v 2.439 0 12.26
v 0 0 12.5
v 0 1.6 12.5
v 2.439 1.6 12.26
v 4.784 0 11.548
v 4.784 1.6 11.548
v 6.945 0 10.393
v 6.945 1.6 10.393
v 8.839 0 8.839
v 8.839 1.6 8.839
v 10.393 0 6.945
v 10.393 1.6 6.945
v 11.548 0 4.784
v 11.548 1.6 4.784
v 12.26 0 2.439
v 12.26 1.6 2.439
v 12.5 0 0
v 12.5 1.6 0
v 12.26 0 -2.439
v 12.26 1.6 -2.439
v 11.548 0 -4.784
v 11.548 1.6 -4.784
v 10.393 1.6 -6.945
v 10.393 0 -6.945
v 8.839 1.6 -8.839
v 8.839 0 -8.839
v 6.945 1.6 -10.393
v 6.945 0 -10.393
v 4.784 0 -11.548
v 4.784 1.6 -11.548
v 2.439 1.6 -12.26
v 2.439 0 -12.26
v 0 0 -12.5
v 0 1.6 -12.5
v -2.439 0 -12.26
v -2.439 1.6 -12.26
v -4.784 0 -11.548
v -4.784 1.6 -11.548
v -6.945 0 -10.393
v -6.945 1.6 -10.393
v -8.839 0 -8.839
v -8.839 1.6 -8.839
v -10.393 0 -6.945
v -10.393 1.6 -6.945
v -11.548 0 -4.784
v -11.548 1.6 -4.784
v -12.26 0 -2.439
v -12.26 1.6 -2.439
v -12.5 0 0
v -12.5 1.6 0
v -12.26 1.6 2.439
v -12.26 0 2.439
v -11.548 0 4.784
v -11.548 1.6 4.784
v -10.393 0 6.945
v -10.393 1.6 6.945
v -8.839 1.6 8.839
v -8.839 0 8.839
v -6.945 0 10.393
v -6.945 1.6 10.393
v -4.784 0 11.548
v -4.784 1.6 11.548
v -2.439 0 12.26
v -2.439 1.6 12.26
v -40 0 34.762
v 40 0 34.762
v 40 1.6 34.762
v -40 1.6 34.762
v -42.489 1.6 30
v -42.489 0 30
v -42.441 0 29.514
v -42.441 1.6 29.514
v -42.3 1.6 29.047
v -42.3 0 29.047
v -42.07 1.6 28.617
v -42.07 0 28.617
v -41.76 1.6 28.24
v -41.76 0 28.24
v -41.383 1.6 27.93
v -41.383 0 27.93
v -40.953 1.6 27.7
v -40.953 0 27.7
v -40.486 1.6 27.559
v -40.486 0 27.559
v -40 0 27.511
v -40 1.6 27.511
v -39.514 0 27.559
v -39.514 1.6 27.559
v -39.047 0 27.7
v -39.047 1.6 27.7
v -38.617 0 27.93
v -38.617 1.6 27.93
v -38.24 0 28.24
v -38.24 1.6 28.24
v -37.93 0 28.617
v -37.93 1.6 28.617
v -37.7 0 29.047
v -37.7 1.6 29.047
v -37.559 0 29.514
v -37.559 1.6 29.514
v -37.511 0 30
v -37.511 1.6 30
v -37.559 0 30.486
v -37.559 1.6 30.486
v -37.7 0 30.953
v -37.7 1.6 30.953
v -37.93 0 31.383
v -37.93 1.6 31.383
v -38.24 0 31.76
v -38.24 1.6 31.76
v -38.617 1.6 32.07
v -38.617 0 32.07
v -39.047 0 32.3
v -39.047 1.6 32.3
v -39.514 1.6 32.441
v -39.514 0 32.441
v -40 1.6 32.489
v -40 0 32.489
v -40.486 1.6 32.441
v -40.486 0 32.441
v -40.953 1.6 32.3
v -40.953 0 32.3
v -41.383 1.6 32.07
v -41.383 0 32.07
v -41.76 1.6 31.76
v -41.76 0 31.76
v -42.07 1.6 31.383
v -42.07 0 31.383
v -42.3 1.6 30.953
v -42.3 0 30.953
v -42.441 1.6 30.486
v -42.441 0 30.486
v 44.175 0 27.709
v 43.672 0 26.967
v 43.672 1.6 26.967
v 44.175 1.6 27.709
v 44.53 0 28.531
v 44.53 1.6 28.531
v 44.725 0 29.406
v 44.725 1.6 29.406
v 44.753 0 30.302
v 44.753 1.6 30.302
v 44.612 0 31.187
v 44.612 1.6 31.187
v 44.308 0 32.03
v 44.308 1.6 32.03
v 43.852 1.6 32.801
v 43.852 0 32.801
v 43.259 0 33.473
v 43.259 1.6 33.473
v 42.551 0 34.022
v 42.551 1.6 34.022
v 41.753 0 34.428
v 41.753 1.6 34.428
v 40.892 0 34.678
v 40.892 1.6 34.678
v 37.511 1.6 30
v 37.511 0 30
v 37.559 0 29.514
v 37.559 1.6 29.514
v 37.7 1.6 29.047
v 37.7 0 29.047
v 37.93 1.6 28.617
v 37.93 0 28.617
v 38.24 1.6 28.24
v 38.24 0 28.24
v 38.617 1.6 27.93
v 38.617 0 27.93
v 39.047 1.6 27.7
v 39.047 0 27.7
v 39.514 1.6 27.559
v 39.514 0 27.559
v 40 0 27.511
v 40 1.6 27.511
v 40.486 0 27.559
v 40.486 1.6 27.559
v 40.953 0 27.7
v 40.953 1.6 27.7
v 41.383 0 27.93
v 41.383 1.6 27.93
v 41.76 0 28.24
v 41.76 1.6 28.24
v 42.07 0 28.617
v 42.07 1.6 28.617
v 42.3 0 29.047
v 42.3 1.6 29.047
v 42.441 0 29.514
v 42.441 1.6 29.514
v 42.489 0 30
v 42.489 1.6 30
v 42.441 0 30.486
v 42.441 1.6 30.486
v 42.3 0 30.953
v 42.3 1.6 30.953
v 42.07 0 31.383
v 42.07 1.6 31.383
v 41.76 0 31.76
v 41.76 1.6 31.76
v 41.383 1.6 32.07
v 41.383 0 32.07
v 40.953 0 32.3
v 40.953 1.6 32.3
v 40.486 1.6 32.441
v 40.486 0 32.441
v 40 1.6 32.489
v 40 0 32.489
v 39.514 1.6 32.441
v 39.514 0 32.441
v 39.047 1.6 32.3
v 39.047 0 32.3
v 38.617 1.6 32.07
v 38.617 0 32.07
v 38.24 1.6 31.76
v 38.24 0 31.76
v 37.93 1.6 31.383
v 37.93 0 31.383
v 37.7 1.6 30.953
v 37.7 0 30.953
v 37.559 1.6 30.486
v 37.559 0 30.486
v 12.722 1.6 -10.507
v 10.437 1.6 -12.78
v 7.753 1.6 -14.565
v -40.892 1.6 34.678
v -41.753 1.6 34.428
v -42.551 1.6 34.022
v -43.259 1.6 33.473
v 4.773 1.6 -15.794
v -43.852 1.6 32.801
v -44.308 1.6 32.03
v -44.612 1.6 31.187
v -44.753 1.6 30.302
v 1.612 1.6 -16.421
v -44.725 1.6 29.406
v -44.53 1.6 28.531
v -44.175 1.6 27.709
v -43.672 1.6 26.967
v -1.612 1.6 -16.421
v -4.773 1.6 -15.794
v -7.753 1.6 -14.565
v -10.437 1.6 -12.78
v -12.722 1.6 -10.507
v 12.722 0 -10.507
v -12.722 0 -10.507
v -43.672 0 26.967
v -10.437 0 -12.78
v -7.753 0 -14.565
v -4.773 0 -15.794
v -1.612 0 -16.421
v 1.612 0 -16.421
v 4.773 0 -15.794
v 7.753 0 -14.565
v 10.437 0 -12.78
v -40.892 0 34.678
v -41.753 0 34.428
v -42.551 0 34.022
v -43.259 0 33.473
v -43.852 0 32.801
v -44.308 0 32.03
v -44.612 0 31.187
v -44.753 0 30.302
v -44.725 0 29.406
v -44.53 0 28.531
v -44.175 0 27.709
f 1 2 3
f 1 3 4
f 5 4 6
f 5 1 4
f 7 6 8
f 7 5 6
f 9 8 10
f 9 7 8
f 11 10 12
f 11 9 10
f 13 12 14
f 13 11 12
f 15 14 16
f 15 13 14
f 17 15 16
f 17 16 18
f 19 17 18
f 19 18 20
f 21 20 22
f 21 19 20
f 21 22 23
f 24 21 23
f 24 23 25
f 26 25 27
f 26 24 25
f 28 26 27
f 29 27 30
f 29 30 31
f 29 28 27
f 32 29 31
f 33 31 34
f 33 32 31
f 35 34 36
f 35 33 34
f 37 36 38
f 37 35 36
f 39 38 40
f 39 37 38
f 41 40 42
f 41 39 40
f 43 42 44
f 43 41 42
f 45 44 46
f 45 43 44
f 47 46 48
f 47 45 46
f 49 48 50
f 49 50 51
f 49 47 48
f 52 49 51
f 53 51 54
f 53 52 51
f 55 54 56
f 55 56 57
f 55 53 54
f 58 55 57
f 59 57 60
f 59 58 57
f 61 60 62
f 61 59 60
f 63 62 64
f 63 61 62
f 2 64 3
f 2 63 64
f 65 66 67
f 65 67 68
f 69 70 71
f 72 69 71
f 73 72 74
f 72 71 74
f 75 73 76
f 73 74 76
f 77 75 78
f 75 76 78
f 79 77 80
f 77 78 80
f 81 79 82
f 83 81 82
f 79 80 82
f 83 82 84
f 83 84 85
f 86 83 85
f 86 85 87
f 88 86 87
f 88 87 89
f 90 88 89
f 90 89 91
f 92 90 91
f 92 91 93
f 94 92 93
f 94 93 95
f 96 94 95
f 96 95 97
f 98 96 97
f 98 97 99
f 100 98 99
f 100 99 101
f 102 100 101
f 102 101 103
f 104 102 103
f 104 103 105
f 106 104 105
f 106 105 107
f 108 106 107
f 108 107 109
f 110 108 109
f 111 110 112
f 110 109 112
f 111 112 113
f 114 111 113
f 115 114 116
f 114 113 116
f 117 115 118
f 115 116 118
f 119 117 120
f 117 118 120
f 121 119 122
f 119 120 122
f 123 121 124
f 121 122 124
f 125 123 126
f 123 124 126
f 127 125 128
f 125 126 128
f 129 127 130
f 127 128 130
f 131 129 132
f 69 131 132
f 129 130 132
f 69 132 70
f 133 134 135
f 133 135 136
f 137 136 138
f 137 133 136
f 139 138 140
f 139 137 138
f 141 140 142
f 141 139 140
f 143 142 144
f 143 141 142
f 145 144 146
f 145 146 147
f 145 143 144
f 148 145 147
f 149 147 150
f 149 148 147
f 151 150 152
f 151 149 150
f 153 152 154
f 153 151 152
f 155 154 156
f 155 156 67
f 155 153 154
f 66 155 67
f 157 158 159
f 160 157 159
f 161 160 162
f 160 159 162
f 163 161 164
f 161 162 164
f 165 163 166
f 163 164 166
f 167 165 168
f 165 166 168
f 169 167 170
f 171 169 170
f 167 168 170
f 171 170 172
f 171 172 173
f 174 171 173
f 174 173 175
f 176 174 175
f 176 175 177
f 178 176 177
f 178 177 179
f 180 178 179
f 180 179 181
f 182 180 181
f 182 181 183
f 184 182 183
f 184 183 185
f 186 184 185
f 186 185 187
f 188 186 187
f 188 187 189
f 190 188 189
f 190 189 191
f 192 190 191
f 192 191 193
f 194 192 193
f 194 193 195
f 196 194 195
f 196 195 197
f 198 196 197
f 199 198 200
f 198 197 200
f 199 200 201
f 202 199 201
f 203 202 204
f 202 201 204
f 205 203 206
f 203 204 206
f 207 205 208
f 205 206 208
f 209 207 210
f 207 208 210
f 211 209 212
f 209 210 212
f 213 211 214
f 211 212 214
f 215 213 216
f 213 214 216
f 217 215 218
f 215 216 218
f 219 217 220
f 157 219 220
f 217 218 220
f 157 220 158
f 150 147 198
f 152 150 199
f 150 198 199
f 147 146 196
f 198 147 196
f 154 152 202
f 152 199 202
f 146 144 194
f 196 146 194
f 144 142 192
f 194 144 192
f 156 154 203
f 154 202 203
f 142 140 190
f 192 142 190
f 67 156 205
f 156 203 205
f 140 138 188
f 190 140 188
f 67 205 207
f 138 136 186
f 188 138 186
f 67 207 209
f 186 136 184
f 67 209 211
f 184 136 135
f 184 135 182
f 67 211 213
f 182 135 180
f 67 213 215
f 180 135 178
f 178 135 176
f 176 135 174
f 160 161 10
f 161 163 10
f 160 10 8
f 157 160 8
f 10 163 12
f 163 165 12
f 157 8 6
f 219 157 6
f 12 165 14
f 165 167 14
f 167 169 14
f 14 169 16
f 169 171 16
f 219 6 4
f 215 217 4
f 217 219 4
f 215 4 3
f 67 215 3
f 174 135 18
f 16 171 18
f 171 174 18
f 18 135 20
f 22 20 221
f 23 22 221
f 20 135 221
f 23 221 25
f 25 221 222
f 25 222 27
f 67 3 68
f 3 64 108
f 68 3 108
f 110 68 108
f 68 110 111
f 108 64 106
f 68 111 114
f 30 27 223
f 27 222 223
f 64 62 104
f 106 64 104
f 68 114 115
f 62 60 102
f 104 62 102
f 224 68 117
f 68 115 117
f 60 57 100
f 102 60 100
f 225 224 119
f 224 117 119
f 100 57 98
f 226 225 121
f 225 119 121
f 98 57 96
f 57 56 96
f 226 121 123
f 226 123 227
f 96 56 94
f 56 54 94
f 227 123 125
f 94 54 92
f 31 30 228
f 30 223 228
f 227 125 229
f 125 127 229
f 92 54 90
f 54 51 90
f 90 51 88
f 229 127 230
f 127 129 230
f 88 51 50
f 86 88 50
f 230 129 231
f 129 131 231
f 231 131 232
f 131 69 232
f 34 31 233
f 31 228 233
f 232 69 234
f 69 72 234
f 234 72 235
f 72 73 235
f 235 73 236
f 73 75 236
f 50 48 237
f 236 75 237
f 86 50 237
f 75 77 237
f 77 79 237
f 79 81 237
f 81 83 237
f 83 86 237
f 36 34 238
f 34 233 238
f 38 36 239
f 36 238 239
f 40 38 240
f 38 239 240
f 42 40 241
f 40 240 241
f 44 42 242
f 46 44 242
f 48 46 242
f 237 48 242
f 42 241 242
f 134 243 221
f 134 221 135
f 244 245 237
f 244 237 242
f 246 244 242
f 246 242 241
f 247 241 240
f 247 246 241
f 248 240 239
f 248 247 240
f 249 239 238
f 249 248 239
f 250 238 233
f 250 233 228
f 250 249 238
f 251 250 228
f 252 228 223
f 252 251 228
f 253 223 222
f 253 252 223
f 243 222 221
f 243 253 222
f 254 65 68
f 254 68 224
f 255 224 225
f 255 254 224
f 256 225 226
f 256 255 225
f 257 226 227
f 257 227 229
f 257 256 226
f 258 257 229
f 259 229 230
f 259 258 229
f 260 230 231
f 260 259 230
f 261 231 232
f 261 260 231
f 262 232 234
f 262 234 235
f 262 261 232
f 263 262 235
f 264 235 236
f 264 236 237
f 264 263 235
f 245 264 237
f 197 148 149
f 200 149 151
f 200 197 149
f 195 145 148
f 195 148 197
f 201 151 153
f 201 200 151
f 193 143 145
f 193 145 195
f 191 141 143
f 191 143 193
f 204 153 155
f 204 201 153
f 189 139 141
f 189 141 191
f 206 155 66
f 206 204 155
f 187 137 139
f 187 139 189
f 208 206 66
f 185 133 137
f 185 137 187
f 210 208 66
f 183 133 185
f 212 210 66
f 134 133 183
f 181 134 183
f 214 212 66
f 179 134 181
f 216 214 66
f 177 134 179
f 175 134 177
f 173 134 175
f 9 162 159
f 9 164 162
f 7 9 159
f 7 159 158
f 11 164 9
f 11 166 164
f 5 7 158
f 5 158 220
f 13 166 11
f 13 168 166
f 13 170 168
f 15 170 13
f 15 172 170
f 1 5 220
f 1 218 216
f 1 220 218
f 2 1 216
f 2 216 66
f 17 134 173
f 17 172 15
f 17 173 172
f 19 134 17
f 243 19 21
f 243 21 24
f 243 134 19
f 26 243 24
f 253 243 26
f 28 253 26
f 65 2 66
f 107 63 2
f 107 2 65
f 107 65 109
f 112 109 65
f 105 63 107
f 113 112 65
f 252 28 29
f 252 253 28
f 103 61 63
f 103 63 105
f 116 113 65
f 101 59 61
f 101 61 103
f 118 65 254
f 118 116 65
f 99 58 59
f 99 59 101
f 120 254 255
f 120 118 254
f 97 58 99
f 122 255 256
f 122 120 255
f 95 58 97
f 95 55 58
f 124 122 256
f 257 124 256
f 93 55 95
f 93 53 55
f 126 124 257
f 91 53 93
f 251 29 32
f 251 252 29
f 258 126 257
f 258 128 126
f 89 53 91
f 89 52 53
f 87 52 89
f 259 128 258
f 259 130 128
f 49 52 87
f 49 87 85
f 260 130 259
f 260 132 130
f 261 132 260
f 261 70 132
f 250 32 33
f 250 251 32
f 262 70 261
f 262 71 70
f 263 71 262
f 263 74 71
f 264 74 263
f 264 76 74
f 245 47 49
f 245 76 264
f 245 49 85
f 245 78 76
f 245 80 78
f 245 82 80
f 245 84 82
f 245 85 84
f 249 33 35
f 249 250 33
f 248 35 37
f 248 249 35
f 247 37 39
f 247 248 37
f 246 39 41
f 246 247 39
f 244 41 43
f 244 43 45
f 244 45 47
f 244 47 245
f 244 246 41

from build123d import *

# Parameters (mm, degrees)
SKETCH1_R                  = 12.5
BOSS_EXTRUDE1_DEPTH        = 1.6002
F_10_CLEARANCE_HOLE1_D     = 4.9784
F_10_CLEARANCE_HOLE1_DEPTH = 172.97
F_10_CLEARANCE_HOLE1_TIP   = 1.495662253


with BuildPart() as part:
    # Sketch1 → Boss-Extrude1 (new body)
    with BuildSketch(Plane(origin=(0, 0, 0), x_dir=(1, 0, 0), z_dir=(0, 1, 0))):
        with BuildLine():
            ThreePointArc((-40, -34.7625), (-44.3084106, -32.029533038), (-43.672046889, -26.967265607))
            Line((-43.672046889, -26.967265607), (-12.722052212, 10.507111283))
            ThreePointArc((-12.722052212, 10.507111283), (0, 16.5), (12.722052212, 10.507111283))
            Line((12.722052212, 10.507111283), (43.672046889, -26.967265607))
            ThreePointArc((43.672046889, -26.967265607), (44.3084106, -32.029533038), (40, -34.7625))
            Line((40, -34.7625), (-40, -34.7625))
        make_face()
        with Locations(Location((0, 0, 0), (0, 0, 270))):  # turned: the seam where the file's is
            Circle(SKETCH1_R, mode=Mode.SUBTRACT)
    extrude(amount=BOSS_EXTRUDE1_DEPTH)

    # #10 Clearance Hole1
    with Locations(Plane(origin=(0, 1.6002, 0), x_dir=(1, 0, 0), z_dir=(0, 1, 0))):
        with Locations((40, -30), (-40, -30)):
            Hole(F_10_CLEARANCE_HOLE1_D / 2, depth=F_10_CLEARANCE_HOLE1_DEPTH)
            with Locations((0, 0, -(F_10_CLEARANCE_HOLE1_DEPTH + F_10_CLEARANCE_HOLE1_TIP / 2))):  # 118° drill point
                Cone(0, F_10_CLEARANCE_HOLE1_D / 2, F_10_CLEARANCE_HOLE1_TIP, mode=Mode.SUBTRACT)


solid = part.part
